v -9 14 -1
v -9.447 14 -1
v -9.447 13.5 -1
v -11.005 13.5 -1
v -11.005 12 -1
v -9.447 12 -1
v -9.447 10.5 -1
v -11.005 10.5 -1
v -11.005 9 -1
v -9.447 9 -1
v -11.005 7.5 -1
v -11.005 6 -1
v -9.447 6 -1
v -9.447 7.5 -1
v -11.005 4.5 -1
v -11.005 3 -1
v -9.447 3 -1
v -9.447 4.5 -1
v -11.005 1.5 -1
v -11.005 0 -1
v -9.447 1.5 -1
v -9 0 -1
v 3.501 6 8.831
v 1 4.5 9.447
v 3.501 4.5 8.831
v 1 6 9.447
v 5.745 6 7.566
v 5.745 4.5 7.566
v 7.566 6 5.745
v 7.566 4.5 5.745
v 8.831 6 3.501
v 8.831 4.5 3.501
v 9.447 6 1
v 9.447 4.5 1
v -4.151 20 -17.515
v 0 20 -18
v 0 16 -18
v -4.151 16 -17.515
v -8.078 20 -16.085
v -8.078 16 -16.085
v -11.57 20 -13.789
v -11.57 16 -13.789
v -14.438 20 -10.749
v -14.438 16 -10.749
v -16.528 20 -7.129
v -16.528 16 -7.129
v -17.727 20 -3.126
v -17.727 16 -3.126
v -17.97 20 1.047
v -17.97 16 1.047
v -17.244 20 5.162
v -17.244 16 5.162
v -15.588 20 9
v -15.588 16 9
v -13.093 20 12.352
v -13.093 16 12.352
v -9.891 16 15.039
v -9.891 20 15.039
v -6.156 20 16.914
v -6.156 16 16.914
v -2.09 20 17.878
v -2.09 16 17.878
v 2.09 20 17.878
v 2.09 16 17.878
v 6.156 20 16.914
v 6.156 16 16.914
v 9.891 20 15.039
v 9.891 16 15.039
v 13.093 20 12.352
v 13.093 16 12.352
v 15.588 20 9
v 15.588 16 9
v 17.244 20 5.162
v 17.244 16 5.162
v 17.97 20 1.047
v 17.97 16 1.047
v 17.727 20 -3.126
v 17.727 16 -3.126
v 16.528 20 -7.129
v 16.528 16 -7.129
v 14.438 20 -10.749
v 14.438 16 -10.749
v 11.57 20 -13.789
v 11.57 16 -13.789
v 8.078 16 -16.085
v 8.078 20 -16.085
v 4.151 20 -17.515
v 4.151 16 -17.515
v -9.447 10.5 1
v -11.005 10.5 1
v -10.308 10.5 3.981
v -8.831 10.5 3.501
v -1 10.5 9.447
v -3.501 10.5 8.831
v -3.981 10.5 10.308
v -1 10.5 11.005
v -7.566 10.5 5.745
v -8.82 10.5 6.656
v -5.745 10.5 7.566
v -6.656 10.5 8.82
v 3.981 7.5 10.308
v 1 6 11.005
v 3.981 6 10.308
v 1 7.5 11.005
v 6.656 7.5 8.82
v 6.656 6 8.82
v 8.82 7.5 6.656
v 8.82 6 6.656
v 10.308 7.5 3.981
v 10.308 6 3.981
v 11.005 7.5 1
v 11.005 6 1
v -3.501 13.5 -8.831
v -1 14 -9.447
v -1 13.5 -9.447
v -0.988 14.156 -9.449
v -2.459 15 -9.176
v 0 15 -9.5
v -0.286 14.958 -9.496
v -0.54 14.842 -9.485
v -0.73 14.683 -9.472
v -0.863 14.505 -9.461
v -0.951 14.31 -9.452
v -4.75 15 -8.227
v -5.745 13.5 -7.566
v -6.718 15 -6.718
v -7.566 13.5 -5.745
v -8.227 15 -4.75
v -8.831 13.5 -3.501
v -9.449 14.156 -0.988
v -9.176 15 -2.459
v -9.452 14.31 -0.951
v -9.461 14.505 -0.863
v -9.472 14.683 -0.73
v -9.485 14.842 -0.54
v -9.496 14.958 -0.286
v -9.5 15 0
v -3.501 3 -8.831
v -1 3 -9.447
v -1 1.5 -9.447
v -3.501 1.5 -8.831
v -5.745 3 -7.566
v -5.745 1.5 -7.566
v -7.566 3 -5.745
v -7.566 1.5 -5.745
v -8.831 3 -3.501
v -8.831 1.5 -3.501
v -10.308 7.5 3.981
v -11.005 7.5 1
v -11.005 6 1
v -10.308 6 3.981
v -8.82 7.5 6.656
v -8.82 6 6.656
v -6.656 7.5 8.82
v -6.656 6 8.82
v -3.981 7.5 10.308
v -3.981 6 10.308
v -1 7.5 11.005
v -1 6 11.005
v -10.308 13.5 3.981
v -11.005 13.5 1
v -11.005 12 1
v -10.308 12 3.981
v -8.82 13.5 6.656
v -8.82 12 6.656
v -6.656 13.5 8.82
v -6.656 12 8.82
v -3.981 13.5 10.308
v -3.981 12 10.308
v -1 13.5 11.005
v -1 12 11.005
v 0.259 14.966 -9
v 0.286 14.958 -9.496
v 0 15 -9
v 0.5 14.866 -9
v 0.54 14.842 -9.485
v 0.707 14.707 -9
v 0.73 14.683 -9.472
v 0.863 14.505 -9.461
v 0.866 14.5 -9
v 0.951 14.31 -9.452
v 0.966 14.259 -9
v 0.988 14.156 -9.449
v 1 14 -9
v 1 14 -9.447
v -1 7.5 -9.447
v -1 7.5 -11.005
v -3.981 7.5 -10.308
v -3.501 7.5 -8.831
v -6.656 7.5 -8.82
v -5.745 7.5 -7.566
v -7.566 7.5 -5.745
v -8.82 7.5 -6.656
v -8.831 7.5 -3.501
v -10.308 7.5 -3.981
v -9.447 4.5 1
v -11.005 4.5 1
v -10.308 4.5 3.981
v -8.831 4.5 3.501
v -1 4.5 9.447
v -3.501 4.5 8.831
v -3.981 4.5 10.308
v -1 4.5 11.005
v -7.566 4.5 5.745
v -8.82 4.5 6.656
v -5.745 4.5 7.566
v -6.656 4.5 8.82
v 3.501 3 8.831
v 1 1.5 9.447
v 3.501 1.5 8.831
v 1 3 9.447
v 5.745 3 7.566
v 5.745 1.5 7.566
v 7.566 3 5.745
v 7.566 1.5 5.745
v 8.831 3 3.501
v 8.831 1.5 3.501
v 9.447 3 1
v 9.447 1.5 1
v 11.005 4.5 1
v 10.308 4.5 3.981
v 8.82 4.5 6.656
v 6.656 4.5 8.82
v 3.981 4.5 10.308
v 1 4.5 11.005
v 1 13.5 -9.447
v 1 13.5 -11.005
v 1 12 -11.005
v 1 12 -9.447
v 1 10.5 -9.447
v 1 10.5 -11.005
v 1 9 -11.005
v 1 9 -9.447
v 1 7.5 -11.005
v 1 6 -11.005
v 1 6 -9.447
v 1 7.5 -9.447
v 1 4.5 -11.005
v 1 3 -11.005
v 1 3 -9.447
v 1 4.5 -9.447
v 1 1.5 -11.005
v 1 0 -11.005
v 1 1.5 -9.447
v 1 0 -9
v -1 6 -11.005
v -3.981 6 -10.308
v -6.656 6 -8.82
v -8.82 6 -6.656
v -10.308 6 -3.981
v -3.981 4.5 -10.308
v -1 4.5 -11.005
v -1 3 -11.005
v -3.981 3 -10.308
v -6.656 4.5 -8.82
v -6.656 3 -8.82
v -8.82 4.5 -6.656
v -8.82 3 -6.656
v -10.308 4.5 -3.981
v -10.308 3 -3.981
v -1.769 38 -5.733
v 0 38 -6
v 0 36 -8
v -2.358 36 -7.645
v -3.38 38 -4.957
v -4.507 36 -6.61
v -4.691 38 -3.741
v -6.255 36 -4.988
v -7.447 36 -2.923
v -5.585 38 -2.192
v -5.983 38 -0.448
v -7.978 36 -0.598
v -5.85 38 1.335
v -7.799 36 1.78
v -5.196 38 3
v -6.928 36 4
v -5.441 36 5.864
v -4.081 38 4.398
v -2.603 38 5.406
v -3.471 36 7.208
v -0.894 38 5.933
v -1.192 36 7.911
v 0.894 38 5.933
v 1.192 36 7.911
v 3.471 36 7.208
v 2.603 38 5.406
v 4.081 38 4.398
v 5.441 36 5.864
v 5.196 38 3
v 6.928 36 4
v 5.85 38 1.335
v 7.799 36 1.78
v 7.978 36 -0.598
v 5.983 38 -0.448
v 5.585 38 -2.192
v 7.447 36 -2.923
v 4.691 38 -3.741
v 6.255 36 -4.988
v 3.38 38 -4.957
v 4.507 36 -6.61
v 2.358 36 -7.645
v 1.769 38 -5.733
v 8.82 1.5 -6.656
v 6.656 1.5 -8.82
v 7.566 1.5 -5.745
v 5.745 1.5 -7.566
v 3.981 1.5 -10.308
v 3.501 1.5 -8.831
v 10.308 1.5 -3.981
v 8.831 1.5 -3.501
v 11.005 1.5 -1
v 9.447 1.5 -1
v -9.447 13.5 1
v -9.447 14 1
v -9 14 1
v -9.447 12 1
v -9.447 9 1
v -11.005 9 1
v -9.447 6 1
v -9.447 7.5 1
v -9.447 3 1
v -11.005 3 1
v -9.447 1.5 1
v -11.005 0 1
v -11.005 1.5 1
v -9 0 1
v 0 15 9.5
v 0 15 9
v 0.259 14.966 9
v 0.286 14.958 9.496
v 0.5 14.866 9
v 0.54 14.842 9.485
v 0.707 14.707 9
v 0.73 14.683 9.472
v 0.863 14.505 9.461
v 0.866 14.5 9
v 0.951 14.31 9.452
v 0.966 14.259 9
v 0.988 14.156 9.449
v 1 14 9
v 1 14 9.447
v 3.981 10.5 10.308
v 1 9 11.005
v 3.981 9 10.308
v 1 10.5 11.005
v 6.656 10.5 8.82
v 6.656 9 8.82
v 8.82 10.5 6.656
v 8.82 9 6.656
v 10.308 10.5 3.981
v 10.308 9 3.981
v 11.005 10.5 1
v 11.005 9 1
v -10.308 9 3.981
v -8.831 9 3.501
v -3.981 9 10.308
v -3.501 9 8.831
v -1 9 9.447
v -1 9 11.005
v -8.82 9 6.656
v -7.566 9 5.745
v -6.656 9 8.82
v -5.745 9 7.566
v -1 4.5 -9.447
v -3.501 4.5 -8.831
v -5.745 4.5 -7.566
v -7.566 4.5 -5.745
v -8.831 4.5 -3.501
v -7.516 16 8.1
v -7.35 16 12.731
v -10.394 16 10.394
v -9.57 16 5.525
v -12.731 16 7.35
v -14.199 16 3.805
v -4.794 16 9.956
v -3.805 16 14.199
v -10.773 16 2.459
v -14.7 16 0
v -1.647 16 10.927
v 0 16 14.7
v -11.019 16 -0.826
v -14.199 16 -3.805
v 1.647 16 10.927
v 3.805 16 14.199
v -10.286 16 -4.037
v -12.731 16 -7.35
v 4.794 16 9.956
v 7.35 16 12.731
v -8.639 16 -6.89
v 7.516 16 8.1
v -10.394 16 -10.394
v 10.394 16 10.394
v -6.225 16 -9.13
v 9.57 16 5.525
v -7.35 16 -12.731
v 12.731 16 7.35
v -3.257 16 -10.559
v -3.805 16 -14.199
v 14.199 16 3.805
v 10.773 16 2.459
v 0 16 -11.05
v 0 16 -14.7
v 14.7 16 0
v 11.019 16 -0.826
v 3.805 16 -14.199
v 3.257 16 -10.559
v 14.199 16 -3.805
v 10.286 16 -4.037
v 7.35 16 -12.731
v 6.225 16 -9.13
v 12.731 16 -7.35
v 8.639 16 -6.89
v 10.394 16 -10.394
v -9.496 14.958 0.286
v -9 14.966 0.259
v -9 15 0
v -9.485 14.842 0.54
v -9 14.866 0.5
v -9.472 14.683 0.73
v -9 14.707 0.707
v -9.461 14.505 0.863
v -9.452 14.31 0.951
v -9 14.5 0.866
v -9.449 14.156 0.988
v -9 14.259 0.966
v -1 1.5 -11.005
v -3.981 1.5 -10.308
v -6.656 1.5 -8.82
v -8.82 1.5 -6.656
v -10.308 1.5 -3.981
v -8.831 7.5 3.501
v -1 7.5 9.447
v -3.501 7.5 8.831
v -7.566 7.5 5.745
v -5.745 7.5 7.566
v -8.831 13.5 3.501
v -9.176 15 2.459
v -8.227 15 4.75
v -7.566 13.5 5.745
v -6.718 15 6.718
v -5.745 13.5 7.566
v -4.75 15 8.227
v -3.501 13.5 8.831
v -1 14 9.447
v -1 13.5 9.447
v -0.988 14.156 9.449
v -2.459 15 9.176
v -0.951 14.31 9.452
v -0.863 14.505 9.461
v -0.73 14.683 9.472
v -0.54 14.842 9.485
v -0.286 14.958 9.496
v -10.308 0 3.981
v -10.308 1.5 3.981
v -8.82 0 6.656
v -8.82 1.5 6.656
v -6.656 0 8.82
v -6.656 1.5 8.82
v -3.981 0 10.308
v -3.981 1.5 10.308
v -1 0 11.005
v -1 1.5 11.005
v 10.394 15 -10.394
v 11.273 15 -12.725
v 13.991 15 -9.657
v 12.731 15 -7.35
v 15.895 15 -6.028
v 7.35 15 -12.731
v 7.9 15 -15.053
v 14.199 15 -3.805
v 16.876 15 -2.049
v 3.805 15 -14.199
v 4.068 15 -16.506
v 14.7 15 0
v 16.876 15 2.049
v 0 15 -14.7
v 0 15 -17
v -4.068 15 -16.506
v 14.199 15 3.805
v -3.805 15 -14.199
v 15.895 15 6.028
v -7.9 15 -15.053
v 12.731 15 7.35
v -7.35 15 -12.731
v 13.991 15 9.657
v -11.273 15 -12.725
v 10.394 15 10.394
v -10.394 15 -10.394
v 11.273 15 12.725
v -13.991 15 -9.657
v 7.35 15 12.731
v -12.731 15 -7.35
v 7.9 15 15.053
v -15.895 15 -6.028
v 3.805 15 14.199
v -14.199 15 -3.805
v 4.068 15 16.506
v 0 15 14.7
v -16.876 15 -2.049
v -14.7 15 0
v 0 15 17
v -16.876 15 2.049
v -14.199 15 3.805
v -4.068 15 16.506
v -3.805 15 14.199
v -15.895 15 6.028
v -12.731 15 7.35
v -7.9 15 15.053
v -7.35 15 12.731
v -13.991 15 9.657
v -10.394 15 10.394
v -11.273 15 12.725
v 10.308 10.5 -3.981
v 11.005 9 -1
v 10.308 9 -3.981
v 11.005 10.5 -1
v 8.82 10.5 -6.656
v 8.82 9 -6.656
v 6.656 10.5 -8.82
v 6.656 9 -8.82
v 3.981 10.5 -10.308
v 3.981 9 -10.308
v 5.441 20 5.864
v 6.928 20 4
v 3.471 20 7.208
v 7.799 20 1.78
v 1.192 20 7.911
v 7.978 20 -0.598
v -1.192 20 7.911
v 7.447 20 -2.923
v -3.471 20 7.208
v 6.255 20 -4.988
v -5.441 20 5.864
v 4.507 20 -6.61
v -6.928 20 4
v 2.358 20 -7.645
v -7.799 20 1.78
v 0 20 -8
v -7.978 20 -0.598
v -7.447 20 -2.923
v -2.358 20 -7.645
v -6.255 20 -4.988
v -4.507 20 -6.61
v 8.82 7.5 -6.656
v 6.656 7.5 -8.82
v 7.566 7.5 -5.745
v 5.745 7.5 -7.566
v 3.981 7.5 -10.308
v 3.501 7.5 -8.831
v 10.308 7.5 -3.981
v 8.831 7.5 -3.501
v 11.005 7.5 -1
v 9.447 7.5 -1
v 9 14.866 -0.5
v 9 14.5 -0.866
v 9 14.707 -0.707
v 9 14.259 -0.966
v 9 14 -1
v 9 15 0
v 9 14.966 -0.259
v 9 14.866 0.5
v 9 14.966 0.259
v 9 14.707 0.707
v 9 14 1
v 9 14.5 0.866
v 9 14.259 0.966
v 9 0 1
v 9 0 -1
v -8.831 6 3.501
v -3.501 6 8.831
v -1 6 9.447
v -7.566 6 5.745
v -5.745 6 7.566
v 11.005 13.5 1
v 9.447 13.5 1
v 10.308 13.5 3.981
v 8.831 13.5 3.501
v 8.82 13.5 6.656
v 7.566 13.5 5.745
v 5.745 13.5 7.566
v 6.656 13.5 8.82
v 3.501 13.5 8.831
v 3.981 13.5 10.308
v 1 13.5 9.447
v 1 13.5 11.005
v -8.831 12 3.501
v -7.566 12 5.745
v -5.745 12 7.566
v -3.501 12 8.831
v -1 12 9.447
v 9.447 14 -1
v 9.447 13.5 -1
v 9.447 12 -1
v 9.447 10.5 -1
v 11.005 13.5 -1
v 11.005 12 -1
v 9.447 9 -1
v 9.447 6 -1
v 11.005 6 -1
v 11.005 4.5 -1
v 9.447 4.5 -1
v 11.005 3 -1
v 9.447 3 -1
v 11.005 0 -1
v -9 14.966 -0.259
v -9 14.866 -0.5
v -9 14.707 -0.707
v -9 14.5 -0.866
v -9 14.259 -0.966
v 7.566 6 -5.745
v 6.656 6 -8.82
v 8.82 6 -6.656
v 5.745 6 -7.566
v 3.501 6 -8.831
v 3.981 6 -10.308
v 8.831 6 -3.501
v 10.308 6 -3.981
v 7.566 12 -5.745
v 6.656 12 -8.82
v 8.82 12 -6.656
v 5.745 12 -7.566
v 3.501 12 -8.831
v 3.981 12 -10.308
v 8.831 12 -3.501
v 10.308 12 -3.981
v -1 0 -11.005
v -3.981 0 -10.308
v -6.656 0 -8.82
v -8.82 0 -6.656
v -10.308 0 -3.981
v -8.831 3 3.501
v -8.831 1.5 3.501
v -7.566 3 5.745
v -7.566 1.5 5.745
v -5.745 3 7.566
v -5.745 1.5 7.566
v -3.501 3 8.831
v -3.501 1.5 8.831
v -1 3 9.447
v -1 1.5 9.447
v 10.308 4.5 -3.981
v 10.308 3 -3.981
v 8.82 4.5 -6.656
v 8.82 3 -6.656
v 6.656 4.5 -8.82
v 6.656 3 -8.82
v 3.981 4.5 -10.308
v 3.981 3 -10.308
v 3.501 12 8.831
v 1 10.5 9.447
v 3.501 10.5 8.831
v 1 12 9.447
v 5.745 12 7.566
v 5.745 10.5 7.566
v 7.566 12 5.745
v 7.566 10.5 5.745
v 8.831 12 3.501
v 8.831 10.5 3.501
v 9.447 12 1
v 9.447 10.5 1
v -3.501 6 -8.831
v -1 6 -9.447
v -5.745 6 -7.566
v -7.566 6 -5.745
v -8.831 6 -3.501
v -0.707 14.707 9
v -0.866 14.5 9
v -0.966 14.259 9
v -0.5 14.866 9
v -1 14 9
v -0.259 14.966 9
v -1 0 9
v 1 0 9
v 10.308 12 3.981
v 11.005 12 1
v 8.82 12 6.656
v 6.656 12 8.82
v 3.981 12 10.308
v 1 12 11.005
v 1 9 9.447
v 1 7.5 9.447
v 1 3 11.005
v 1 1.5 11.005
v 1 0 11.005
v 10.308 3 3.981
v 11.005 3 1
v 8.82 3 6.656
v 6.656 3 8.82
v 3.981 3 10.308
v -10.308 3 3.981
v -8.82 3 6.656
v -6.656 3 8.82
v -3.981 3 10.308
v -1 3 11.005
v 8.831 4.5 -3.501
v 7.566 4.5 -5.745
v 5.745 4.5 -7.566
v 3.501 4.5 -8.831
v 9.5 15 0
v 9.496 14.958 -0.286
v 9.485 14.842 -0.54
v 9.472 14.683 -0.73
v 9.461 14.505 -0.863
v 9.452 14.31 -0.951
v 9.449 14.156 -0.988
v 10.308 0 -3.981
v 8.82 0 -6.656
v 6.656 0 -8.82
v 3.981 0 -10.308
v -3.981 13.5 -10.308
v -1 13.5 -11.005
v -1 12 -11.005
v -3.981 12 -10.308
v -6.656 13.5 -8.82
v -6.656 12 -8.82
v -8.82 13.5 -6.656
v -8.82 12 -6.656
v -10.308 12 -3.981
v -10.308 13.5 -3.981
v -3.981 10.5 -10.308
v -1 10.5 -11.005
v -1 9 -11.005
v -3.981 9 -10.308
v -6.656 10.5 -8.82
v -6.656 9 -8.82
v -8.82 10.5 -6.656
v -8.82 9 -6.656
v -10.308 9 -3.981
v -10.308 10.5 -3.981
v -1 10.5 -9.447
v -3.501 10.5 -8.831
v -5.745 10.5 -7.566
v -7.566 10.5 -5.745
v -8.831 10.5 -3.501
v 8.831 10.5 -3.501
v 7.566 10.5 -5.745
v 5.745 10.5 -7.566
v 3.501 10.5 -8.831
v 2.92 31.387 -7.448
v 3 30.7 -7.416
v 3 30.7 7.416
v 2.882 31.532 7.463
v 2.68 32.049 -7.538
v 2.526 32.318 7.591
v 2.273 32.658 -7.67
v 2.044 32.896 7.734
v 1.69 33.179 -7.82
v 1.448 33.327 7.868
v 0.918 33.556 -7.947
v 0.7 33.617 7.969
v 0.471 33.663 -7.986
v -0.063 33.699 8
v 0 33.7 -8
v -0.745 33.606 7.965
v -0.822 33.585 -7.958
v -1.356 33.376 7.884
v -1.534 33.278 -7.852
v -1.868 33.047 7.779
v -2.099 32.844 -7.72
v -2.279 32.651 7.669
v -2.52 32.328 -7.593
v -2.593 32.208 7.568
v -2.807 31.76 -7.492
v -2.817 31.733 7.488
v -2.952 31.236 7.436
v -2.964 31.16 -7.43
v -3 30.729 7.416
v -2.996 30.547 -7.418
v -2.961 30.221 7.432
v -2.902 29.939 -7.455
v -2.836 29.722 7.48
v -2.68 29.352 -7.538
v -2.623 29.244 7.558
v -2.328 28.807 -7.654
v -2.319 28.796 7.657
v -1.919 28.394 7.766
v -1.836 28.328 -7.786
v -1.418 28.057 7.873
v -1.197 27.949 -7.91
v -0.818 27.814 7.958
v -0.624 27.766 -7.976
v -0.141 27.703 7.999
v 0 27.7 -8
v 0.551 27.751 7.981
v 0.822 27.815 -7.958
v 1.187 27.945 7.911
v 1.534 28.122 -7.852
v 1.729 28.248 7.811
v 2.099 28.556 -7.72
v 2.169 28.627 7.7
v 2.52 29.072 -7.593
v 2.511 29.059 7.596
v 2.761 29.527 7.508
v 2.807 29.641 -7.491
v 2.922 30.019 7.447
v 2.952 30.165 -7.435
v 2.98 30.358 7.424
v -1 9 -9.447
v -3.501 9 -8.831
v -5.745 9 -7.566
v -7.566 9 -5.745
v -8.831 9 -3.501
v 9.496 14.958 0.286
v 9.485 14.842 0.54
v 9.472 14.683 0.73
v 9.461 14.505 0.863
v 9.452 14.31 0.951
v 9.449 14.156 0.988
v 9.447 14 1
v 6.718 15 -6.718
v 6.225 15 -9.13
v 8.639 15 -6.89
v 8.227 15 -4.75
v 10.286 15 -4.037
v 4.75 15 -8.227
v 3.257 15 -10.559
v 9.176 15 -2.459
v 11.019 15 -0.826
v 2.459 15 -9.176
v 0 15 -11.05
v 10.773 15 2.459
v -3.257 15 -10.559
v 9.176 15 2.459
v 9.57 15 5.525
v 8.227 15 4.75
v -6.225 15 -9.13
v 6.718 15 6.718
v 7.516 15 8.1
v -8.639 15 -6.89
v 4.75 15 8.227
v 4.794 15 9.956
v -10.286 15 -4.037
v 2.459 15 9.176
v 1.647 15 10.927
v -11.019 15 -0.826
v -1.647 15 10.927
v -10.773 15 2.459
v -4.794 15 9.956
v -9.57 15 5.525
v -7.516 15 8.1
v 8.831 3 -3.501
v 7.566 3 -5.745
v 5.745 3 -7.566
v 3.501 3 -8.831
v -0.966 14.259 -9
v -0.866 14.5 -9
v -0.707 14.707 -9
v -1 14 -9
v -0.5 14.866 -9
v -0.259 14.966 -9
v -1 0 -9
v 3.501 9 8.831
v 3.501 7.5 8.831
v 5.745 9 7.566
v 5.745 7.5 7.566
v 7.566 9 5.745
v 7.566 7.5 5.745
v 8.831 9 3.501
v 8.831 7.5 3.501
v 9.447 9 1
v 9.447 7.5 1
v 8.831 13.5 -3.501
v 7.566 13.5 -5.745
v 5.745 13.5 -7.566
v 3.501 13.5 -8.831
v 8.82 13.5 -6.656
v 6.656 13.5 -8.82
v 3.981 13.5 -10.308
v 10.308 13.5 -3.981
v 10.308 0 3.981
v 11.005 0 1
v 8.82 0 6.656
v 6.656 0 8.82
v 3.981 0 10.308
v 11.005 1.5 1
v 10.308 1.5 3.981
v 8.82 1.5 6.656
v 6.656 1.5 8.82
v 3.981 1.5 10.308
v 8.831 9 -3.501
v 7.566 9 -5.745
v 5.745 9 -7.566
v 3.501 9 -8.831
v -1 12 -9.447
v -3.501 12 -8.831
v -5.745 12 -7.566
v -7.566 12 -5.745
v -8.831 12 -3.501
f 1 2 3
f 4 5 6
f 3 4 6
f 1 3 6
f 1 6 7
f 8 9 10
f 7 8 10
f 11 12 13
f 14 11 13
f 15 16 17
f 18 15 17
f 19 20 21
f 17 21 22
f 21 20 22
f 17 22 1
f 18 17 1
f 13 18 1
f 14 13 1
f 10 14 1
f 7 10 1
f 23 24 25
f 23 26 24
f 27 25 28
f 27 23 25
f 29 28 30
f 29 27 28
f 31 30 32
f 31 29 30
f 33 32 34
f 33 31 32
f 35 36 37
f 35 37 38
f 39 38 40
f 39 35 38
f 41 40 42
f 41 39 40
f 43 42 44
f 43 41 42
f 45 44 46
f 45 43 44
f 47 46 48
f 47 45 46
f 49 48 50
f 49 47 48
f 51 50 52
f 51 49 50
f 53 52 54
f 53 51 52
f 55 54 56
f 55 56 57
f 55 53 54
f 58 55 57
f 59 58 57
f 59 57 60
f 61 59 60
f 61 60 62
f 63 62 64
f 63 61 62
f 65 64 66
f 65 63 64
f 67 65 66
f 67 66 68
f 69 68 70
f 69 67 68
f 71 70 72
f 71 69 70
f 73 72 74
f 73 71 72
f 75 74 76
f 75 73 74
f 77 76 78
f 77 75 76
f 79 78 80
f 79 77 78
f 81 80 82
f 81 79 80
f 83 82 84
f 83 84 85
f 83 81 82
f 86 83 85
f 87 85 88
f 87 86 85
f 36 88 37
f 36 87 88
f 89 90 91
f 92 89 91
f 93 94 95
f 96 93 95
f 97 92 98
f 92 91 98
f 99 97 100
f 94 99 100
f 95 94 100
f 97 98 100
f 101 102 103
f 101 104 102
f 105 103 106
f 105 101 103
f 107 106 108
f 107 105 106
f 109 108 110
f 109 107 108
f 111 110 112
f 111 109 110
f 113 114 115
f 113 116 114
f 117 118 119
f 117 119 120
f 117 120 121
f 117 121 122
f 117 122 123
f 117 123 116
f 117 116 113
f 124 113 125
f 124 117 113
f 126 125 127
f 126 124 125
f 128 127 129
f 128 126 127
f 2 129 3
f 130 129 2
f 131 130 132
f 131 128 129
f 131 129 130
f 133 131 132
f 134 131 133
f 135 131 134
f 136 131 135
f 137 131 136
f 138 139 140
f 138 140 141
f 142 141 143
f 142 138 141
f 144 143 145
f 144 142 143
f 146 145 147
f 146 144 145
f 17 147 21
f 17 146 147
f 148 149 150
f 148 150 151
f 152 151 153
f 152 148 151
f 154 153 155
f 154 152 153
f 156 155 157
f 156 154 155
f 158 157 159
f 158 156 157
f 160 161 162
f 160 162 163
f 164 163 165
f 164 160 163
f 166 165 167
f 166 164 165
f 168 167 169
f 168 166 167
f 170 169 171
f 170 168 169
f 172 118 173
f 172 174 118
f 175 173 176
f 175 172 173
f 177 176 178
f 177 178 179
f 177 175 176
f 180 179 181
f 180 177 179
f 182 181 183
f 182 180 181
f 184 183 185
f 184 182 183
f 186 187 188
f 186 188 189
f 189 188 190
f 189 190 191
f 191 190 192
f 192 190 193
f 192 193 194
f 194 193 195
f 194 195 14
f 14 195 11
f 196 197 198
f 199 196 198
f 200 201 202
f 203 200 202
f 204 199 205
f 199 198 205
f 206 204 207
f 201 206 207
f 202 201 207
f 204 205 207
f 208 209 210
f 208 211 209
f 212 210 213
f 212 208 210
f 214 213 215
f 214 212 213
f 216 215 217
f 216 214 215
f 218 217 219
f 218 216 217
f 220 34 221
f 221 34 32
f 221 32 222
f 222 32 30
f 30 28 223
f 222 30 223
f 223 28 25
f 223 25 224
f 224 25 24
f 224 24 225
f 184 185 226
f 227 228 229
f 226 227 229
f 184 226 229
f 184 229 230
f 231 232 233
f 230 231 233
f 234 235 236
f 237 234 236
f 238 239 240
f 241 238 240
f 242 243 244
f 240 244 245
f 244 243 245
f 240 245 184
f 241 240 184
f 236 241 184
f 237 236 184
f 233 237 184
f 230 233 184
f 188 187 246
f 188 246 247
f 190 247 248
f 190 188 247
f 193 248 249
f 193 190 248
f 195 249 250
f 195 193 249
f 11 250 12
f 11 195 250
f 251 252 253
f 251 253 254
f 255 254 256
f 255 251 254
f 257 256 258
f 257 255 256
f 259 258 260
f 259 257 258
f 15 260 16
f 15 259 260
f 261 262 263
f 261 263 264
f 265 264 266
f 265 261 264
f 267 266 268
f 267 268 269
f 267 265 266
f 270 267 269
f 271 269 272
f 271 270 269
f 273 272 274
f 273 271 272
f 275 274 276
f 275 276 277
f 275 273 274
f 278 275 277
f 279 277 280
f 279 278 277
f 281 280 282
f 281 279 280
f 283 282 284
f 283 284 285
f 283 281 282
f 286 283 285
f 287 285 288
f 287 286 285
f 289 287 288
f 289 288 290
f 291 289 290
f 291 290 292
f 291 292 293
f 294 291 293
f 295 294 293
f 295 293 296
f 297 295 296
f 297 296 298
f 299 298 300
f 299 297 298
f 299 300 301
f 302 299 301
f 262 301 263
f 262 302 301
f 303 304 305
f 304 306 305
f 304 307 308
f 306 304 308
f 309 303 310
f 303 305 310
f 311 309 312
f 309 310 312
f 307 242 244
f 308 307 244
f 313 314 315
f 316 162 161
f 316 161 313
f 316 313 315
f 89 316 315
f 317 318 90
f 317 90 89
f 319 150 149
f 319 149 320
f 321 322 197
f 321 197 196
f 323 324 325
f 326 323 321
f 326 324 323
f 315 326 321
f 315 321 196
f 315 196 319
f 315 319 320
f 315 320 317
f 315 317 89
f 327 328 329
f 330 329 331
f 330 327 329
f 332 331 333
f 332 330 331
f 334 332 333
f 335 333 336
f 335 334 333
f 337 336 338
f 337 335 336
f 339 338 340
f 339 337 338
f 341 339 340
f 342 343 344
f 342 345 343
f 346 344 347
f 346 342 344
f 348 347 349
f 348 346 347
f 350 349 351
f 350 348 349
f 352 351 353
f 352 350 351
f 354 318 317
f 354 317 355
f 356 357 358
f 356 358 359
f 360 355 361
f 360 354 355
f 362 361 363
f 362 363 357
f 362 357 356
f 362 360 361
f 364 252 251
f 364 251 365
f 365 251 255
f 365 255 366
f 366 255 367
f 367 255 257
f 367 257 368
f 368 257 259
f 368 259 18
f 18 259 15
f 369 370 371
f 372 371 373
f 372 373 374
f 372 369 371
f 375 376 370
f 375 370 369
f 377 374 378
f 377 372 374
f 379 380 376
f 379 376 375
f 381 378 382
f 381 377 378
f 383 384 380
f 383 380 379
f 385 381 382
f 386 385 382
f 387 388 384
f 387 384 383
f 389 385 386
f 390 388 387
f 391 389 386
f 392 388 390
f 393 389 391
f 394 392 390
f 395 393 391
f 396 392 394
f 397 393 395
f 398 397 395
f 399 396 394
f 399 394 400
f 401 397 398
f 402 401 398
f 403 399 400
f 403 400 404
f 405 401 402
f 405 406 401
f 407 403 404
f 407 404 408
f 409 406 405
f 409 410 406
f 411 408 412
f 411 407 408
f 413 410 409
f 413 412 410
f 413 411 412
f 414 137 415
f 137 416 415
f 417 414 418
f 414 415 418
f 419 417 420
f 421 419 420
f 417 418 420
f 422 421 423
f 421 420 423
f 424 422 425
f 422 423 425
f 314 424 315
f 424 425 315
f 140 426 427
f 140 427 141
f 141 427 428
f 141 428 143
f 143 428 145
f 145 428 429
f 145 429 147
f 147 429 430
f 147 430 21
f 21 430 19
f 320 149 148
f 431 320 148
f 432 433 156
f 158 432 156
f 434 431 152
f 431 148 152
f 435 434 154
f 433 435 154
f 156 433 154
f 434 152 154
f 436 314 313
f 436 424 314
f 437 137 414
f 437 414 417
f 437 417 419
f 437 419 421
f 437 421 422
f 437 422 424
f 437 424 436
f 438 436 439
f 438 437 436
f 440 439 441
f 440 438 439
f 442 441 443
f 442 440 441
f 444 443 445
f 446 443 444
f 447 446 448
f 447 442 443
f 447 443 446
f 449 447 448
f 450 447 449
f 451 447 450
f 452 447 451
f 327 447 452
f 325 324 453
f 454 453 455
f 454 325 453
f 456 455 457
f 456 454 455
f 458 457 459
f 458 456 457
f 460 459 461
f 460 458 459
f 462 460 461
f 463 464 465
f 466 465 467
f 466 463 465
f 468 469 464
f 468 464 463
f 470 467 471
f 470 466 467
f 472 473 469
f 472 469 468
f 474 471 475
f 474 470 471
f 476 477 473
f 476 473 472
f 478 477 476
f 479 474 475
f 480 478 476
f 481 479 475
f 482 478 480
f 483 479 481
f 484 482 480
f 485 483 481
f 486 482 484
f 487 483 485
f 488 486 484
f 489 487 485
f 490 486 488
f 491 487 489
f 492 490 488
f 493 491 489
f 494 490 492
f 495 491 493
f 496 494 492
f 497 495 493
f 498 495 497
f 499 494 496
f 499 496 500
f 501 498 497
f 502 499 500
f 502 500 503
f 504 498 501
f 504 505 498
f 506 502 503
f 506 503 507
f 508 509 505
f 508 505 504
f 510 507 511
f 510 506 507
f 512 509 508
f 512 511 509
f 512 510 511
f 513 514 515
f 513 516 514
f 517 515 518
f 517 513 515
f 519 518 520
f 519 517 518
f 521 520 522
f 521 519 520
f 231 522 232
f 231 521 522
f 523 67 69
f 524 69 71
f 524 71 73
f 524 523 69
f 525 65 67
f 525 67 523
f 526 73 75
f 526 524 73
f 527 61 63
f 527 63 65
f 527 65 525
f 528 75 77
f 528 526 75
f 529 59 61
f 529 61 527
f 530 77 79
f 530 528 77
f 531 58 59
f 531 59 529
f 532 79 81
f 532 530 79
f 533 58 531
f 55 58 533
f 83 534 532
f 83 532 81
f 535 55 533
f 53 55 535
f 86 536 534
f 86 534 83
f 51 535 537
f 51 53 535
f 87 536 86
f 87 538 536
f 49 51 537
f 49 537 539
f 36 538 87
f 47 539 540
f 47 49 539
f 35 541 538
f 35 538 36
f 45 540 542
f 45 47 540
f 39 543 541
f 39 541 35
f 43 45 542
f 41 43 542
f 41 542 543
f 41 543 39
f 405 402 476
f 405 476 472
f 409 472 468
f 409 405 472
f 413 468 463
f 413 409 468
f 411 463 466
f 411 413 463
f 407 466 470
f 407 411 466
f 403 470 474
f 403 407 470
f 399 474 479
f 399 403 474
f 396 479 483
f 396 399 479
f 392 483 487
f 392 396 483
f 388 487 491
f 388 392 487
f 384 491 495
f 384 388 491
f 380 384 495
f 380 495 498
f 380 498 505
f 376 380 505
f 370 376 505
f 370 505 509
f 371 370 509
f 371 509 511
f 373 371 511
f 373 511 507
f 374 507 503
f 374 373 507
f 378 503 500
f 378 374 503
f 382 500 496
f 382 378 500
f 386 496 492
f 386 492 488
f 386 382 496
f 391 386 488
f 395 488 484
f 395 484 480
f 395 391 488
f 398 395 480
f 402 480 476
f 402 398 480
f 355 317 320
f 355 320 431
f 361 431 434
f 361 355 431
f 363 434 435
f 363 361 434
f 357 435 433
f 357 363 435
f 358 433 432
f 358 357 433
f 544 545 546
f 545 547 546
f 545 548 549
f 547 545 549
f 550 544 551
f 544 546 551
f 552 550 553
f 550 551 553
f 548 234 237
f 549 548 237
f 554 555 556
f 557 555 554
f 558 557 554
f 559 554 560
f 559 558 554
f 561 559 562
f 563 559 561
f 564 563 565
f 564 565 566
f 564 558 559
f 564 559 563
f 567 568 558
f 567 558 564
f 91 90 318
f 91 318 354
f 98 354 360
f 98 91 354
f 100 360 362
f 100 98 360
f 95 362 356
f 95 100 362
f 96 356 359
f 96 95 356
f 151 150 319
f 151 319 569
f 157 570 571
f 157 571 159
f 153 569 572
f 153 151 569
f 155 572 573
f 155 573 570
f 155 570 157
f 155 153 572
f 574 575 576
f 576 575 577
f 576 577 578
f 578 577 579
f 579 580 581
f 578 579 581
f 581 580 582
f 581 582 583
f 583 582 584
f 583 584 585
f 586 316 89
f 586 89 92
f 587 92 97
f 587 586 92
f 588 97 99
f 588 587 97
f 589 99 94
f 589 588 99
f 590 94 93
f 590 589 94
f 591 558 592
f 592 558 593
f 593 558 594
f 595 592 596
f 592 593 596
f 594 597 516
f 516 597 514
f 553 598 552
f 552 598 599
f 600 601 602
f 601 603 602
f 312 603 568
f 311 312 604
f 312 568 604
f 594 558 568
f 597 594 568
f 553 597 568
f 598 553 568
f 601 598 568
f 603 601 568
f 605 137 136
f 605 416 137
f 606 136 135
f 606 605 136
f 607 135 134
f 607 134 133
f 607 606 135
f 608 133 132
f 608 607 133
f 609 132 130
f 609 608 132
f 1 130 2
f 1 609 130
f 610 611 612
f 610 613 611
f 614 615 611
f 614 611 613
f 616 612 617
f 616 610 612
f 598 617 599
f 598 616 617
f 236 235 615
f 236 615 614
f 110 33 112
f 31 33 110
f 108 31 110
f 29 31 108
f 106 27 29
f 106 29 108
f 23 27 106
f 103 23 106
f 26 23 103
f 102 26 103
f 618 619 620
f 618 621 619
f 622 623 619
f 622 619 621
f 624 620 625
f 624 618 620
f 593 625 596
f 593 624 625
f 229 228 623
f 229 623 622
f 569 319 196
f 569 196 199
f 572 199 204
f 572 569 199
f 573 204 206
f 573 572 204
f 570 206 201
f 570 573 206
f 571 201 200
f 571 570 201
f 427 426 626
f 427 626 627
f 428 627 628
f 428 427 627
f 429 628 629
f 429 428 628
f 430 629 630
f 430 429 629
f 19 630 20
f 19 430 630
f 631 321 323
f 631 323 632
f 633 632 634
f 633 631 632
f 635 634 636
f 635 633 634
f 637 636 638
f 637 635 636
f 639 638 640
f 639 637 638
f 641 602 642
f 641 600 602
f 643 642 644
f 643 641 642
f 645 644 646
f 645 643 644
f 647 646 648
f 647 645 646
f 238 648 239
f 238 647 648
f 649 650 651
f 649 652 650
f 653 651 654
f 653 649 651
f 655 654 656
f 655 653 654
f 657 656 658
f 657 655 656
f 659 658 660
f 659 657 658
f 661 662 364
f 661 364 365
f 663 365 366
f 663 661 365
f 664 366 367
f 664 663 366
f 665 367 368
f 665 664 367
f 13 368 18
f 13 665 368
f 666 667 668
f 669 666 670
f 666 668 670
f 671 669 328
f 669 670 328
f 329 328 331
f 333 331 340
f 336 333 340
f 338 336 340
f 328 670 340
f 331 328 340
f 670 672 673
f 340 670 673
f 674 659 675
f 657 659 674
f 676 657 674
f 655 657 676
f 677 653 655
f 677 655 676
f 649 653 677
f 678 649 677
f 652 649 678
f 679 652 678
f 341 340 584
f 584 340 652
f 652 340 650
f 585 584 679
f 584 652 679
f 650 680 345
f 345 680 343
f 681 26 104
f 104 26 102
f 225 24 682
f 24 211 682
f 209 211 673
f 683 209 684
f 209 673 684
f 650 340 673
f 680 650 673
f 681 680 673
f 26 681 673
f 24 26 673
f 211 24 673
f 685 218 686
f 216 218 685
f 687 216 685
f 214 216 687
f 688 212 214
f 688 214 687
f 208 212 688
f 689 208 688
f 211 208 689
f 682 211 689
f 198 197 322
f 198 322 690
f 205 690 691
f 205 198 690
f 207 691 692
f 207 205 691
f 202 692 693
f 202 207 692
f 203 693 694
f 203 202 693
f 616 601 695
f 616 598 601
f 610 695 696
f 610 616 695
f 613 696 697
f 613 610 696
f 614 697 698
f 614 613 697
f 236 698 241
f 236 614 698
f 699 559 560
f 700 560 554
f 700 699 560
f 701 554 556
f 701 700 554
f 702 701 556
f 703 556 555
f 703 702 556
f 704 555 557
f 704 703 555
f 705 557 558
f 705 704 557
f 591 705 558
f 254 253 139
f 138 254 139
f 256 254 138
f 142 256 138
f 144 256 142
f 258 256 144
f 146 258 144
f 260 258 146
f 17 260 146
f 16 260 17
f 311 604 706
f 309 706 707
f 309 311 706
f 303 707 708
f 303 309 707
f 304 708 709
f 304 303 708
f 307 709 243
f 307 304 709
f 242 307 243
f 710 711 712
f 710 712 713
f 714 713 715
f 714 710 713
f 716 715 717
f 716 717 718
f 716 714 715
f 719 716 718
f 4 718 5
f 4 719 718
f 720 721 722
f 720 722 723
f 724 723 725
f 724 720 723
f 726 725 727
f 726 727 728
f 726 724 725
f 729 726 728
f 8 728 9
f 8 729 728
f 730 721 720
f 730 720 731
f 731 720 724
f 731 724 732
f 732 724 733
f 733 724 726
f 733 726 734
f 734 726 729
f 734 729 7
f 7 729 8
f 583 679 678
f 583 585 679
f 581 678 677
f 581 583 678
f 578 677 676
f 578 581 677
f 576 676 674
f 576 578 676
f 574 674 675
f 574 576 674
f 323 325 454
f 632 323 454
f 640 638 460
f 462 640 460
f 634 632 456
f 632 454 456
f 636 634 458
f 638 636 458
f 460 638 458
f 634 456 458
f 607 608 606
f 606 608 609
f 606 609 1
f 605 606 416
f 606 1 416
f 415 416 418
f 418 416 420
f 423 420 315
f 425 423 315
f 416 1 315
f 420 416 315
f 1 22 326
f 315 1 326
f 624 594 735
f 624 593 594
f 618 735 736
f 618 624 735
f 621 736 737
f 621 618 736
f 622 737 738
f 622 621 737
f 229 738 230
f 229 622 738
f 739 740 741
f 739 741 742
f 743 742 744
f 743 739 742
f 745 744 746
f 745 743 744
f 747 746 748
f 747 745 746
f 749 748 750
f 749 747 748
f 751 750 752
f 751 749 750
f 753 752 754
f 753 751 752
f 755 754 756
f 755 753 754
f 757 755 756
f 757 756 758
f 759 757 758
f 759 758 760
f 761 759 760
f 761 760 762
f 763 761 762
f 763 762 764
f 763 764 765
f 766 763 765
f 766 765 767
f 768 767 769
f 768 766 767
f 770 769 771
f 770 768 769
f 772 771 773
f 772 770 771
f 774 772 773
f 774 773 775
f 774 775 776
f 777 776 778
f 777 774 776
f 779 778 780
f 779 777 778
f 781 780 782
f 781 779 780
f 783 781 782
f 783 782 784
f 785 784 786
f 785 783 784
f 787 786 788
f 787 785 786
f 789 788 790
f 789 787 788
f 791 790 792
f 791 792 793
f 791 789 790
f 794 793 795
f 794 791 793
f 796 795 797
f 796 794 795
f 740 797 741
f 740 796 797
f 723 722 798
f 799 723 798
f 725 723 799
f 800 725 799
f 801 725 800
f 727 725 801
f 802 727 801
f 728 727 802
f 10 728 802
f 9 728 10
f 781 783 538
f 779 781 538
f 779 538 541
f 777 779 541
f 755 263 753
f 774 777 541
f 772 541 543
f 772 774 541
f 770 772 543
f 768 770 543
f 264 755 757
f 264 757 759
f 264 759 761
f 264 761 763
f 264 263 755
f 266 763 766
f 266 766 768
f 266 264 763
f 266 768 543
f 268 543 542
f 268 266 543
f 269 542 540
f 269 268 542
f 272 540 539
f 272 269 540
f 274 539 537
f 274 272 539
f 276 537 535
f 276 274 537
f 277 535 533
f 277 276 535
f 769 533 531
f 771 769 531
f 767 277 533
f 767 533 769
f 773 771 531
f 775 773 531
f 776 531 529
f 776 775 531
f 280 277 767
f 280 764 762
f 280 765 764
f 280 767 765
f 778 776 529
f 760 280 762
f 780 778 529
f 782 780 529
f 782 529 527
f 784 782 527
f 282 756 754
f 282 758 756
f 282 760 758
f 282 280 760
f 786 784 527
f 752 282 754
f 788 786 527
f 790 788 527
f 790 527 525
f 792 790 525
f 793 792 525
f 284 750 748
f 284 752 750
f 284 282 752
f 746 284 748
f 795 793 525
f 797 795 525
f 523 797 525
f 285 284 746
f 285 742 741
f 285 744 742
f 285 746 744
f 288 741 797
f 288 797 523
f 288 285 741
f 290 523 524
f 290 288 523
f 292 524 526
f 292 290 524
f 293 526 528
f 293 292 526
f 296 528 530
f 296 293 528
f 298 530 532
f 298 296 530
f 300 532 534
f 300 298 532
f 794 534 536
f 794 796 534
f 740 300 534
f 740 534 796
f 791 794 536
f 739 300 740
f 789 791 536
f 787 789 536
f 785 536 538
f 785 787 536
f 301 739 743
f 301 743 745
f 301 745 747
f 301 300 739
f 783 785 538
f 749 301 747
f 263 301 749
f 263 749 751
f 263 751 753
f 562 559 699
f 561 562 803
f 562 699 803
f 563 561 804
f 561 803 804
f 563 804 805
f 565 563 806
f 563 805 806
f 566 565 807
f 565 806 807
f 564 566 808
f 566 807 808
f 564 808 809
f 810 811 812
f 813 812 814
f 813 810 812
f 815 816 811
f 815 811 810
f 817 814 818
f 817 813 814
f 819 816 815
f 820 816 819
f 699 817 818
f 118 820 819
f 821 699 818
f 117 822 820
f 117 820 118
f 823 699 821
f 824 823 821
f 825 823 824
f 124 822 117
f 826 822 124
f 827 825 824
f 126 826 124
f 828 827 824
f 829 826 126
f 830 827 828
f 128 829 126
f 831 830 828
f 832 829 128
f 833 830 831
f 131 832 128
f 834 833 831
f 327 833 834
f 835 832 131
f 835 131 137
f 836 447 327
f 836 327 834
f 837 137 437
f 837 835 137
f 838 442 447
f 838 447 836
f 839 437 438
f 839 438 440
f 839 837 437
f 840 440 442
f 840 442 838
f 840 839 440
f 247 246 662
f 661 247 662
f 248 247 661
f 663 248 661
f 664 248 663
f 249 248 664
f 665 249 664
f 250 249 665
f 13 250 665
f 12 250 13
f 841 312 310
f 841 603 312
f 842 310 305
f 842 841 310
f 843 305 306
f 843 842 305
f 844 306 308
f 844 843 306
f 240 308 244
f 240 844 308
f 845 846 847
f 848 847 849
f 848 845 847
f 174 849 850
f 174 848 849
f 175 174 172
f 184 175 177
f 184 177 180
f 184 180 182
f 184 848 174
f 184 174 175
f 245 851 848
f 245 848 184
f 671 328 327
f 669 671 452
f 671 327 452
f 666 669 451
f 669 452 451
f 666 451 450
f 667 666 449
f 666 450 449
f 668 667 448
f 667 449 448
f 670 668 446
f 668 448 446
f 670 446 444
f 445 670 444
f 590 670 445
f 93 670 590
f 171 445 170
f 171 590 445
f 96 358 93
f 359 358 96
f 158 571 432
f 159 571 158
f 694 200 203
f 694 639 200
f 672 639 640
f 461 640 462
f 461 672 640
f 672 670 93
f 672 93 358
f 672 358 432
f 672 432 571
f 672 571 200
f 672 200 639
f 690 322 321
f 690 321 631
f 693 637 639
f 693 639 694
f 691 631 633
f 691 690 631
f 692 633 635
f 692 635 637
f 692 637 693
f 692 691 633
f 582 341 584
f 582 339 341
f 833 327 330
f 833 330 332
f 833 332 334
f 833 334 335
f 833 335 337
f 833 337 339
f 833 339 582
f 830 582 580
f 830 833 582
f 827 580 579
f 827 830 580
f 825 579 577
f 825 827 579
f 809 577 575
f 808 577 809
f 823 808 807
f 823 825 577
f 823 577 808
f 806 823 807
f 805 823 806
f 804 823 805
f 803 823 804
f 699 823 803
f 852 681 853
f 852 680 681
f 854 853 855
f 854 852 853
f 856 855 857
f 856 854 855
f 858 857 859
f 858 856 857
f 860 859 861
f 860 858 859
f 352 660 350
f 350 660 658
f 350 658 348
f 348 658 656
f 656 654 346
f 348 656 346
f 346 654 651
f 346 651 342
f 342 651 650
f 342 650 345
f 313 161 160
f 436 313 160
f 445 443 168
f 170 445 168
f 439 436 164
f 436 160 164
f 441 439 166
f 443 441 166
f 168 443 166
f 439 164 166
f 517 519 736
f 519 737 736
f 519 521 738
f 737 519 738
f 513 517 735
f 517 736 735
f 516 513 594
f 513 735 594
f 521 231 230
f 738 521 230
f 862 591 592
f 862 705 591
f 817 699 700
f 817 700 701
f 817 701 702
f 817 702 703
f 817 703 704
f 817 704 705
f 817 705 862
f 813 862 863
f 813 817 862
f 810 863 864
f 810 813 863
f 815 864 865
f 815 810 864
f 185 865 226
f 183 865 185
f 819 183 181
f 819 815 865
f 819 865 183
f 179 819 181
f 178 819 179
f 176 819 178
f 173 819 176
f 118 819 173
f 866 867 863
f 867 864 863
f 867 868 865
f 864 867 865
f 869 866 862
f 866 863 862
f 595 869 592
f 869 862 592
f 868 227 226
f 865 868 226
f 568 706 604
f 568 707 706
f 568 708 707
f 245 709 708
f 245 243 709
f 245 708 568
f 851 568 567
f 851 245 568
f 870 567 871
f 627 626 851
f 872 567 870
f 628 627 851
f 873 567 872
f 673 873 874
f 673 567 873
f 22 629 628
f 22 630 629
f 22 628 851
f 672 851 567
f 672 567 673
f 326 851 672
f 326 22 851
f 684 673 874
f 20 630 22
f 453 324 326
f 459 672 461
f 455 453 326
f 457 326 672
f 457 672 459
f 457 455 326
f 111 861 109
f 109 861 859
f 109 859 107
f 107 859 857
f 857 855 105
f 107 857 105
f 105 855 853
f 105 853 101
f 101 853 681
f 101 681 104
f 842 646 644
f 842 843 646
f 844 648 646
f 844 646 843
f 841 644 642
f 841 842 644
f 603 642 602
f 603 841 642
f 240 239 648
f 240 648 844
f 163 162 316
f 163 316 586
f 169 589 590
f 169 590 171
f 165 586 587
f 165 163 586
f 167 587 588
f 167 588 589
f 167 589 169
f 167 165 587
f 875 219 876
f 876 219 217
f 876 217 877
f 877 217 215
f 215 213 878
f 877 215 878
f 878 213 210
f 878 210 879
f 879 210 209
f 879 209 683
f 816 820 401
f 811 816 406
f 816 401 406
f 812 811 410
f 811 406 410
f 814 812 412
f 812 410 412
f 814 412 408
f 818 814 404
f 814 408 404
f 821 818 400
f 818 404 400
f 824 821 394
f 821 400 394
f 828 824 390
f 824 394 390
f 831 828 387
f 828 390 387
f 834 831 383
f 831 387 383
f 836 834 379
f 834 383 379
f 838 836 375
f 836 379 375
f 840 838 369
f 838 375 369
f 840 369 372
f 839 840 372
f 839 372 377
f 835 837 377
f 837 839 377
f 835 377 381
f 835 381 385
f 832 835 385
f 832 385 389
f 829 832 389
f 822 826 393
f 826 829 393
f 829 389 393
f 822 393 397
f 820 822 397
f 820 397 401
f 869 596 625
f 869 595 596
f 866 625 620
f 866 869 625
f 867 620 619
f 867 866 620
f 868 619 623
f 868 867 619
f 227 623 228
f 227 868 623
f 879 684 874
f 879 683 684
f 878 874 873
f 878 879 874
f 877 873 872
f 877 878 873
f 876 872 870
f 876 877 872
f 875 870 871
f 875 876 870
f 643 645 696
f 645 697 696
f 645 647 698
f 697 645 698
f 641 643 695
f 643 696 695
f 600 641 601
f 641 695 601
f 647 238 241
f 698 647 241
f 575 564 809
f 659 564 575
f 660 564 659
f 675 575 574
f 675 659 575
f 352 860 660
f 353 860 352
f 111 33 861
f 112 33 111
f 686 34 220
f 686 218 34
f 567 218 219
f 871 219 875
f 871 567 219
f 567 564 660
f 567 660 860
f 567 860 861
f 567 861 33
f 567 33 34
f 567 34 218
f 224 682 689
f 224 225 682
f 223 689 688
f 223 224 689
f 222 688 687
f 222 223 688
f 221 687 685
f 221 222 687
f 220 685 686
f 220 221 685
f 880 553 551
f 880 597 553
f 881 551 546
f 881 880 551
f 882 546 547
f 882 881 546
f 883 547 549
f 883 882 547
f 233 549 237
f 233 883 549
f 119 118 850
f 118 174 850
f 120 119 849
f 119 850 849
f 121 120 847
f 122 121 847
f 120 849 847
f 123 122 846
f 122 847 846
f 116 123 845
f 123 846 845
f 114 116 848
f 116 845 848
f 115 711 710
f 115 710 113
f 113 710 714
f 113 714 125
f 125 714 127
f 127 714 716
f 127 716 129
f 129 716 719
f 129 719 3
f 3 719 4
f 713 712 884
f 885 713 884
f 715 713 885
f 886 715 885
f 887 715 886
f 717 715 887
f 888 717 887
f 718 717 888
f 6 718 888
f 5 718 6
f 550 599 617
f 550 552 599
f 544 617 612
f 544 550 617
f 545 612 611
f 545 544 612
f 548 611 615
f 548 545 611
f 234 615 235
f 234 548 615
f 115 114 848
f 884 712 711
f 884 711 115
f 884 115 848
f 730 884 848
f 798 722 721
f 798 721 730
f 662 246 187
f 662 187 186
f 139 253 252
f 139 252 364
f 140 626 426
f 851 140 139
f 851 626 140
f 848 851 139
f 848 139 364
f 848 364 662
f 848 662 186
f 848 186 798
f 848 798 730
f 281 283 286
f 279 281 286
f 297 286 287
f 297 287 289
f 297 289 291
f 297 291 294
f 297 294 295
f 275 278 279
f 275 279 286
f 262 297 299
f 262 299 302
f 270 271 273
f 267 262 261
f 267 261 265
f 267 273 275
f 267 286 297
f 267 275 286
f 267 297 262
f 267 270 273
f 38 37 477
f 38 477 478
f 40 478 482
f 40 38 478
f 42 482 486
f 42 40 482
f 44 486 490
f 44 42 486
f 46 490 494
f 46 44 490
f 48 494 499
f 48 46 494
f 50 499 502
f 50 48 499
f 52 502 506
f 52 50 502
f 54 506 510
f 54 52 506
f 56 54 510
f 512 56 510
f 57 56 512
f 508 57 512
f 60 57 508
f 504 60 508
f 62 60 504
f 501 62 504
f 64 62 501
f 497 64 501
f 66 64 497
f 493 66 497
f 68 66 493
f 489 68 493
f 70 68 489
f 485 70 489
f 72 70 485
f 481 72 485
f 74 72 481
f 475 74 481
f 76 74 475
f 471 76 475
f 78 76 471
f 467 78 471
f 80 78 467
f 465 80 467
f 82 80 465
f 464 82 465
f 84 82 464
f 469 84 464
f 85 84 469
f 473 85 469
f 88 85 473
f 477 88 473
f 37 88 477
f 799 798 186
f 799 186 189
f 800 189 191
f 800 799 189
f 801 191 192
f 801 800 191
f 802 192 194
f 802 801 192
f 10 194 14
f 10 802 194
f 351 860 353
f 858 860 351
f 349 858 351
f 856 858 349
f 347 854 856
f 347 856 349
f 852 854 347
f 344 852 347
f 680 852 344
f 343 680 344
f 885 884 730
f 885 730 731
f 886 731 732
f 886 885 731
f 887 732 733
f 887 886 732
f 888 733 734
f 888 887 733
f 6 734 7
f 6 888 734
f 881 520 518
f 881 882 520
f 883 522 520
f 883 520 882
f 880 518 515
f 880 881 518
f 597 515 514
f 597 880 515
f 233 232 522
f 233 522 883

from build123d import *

# Parameters (mm, degrees)
CUT_EXTRUDE1_DEPTH      = 46.738386504
CUT_EXTRUDE1_DEPTH_BACK = 46.738386504
SKETCH2_R               = 3
CHAMFER1_SIZE           = 1
SKETCH3_W               = 1.55
SKETCH3_H               = 1.5
CUT_EXTRUDE3_START      = -1
SKETCH4_R               = 14.7
SKETCH4_R_2             = 11.05
CUT_EXTRUDE3_DEPTH      = 1
SKETCH5_W               = 2
SKETCH5_H               = 3
SKETCH5_W_2             = 3
SKETCH5_H_2             = 2
CUT_EXTRUDE4_DEPTH      = 15
FILLET1_R               = 1
CHAMFER2_SIZE           = 2


with BuildPart() as part:
    # Sketch1 → Revolve1 (revolve)
    with BuildSketch(Plane.XY, mode=Mode.PRIVATE) as revolve1_sk:
        Polygon((0, 0), (11.05, 0), (11.05, 15), (18, 15), (18, 20), (8, 20), (8, 38), (0, 38), align=None)
    revolve(revolve1_sk.sketch.rotate(Axis((0, 0, 0), (0, 1, 0)), 90), axis=Axis((0, 0, 0), (0, 1, 0)))

    # Sketch2 → Cut-Extrude1 (cut, two sides: drawn at the far end of the back side and taken through both)
    with BuildSketch(Plane.XY.offset(-CUT_EXTRUDE1_DEPTH_BACK)):
        with Locations((0, 30.7)):
            Circle(SKETCH2_R)
    extrude(amount=CUT_EXTRUDE1_DEPTH + CUT_EXTRUDE1_DEPTH_BACK, mode=Mode.SUBTRACT)

    # Chamfer1
    chamfer1_edges = [part.edges().sort_by_distance(p)[0] for p in [
        (0, 15, 18),
    ]]
    chamfer(chamfer1_edges, length=CHAMFER1_SIZE)

    # Sketch3 → Cut-Revolve1 (revolve, cut)
    with BuildSketch(Plane.XY, mode=Mode.PRIVATE) as cut_revolve1_sk:
        with Locations((10.275, 2.25)):
            Rectangle(SKETCH3_W, SKETCH3_H)
        with Locations((10.275, 5.25)):
            Rectangle(SKETCH3_W, SKETCH3_H)
        with Locations((10.275, 8.25)):
            Rectangle(SKETCH3_W, SKETCH3_H)
        with Locations((10.275, 11.25)):
            Rectangle(SKETCH3_W, SKETCH3_H)
        with Locations((10.275, 14.25)):
            Rectangle(SKETCH3_W, SKETCH3_H)
    revolve(cut_revolve1_sk.sketch.rotate(Axis((0, -2, 0), (0, 1, 0)), 90), axis=Axis((0, -2, 0), (0, 1, 0)), mode=Mode.SUBTRACT)

    # Sketch4 → Cut-Extrude3 (cut)
    with BuildSketch(Plane.XZ.offset(-15).offset(CUT_EXTRUDE3_START)):
        with Locations(Location((0, 0, 0), (0, 0, 270))):
            Circle(SKETCH4_R)
        with Locations(Location((0, 0, 0), (0, 0, 270))):
            Circle(SKETCH4_R_2, mode=Mode.SUBTRACT)
    extrude(amount=CUT_EXTRUDE3_DEPTH, mode=Mode.SUBTRACT)

    # Sketch5 → Cut-Extrude4 (cut)
    with BuildSketch(Plane.XZ):
        with Locations((0, -10.5)):
            Rectangle(SKETCH5_W, SKETCH5_H)
        with Locations((0, 10.5)):
            Rectangle(SKETCH5_W, SKETCH5_H)
        with Locations((-10.5, 0)):
            Rectangle(SKETCH5_W_2, SKETCH5_H_2)
        with Locations((10.5, 0)):
            Rectangle(SKETCH5_W_2, SKETCH5_H_2)
    extrude(amount=-CUT_EXTRUDE4_DEPTH, mode=Mode.SUBTRACT)

    # Fillet1
    fillet1_edges = [part.edges().sort_by_distance(p)[0] for p in [
        (9.223610907, 15, -1),
        (9.223610907, 15, 1),
        (-1, 15, -9.223610907),
        (1, 15, -9.223610907),
        (-9.223610907, 15, 1),
        (-9.223610907, 15, -1),
        (1, 15, 9.223610907),
        (-1, 15, 9.223610907),
    ]]
    fillet(fillet1_edges, radius=FILLET1_R - 0.0001)  # a hair under: the kernel refuses the full size

    # Chamfer2
    chamfer2_edges = [part.edges().sort_by_distance(p)[0] for p in [
        (0, 38, 8),
    ]]
    chamfer(chamfer2_edges, length=CHAMFER2_SIZE)


solid = part.part
